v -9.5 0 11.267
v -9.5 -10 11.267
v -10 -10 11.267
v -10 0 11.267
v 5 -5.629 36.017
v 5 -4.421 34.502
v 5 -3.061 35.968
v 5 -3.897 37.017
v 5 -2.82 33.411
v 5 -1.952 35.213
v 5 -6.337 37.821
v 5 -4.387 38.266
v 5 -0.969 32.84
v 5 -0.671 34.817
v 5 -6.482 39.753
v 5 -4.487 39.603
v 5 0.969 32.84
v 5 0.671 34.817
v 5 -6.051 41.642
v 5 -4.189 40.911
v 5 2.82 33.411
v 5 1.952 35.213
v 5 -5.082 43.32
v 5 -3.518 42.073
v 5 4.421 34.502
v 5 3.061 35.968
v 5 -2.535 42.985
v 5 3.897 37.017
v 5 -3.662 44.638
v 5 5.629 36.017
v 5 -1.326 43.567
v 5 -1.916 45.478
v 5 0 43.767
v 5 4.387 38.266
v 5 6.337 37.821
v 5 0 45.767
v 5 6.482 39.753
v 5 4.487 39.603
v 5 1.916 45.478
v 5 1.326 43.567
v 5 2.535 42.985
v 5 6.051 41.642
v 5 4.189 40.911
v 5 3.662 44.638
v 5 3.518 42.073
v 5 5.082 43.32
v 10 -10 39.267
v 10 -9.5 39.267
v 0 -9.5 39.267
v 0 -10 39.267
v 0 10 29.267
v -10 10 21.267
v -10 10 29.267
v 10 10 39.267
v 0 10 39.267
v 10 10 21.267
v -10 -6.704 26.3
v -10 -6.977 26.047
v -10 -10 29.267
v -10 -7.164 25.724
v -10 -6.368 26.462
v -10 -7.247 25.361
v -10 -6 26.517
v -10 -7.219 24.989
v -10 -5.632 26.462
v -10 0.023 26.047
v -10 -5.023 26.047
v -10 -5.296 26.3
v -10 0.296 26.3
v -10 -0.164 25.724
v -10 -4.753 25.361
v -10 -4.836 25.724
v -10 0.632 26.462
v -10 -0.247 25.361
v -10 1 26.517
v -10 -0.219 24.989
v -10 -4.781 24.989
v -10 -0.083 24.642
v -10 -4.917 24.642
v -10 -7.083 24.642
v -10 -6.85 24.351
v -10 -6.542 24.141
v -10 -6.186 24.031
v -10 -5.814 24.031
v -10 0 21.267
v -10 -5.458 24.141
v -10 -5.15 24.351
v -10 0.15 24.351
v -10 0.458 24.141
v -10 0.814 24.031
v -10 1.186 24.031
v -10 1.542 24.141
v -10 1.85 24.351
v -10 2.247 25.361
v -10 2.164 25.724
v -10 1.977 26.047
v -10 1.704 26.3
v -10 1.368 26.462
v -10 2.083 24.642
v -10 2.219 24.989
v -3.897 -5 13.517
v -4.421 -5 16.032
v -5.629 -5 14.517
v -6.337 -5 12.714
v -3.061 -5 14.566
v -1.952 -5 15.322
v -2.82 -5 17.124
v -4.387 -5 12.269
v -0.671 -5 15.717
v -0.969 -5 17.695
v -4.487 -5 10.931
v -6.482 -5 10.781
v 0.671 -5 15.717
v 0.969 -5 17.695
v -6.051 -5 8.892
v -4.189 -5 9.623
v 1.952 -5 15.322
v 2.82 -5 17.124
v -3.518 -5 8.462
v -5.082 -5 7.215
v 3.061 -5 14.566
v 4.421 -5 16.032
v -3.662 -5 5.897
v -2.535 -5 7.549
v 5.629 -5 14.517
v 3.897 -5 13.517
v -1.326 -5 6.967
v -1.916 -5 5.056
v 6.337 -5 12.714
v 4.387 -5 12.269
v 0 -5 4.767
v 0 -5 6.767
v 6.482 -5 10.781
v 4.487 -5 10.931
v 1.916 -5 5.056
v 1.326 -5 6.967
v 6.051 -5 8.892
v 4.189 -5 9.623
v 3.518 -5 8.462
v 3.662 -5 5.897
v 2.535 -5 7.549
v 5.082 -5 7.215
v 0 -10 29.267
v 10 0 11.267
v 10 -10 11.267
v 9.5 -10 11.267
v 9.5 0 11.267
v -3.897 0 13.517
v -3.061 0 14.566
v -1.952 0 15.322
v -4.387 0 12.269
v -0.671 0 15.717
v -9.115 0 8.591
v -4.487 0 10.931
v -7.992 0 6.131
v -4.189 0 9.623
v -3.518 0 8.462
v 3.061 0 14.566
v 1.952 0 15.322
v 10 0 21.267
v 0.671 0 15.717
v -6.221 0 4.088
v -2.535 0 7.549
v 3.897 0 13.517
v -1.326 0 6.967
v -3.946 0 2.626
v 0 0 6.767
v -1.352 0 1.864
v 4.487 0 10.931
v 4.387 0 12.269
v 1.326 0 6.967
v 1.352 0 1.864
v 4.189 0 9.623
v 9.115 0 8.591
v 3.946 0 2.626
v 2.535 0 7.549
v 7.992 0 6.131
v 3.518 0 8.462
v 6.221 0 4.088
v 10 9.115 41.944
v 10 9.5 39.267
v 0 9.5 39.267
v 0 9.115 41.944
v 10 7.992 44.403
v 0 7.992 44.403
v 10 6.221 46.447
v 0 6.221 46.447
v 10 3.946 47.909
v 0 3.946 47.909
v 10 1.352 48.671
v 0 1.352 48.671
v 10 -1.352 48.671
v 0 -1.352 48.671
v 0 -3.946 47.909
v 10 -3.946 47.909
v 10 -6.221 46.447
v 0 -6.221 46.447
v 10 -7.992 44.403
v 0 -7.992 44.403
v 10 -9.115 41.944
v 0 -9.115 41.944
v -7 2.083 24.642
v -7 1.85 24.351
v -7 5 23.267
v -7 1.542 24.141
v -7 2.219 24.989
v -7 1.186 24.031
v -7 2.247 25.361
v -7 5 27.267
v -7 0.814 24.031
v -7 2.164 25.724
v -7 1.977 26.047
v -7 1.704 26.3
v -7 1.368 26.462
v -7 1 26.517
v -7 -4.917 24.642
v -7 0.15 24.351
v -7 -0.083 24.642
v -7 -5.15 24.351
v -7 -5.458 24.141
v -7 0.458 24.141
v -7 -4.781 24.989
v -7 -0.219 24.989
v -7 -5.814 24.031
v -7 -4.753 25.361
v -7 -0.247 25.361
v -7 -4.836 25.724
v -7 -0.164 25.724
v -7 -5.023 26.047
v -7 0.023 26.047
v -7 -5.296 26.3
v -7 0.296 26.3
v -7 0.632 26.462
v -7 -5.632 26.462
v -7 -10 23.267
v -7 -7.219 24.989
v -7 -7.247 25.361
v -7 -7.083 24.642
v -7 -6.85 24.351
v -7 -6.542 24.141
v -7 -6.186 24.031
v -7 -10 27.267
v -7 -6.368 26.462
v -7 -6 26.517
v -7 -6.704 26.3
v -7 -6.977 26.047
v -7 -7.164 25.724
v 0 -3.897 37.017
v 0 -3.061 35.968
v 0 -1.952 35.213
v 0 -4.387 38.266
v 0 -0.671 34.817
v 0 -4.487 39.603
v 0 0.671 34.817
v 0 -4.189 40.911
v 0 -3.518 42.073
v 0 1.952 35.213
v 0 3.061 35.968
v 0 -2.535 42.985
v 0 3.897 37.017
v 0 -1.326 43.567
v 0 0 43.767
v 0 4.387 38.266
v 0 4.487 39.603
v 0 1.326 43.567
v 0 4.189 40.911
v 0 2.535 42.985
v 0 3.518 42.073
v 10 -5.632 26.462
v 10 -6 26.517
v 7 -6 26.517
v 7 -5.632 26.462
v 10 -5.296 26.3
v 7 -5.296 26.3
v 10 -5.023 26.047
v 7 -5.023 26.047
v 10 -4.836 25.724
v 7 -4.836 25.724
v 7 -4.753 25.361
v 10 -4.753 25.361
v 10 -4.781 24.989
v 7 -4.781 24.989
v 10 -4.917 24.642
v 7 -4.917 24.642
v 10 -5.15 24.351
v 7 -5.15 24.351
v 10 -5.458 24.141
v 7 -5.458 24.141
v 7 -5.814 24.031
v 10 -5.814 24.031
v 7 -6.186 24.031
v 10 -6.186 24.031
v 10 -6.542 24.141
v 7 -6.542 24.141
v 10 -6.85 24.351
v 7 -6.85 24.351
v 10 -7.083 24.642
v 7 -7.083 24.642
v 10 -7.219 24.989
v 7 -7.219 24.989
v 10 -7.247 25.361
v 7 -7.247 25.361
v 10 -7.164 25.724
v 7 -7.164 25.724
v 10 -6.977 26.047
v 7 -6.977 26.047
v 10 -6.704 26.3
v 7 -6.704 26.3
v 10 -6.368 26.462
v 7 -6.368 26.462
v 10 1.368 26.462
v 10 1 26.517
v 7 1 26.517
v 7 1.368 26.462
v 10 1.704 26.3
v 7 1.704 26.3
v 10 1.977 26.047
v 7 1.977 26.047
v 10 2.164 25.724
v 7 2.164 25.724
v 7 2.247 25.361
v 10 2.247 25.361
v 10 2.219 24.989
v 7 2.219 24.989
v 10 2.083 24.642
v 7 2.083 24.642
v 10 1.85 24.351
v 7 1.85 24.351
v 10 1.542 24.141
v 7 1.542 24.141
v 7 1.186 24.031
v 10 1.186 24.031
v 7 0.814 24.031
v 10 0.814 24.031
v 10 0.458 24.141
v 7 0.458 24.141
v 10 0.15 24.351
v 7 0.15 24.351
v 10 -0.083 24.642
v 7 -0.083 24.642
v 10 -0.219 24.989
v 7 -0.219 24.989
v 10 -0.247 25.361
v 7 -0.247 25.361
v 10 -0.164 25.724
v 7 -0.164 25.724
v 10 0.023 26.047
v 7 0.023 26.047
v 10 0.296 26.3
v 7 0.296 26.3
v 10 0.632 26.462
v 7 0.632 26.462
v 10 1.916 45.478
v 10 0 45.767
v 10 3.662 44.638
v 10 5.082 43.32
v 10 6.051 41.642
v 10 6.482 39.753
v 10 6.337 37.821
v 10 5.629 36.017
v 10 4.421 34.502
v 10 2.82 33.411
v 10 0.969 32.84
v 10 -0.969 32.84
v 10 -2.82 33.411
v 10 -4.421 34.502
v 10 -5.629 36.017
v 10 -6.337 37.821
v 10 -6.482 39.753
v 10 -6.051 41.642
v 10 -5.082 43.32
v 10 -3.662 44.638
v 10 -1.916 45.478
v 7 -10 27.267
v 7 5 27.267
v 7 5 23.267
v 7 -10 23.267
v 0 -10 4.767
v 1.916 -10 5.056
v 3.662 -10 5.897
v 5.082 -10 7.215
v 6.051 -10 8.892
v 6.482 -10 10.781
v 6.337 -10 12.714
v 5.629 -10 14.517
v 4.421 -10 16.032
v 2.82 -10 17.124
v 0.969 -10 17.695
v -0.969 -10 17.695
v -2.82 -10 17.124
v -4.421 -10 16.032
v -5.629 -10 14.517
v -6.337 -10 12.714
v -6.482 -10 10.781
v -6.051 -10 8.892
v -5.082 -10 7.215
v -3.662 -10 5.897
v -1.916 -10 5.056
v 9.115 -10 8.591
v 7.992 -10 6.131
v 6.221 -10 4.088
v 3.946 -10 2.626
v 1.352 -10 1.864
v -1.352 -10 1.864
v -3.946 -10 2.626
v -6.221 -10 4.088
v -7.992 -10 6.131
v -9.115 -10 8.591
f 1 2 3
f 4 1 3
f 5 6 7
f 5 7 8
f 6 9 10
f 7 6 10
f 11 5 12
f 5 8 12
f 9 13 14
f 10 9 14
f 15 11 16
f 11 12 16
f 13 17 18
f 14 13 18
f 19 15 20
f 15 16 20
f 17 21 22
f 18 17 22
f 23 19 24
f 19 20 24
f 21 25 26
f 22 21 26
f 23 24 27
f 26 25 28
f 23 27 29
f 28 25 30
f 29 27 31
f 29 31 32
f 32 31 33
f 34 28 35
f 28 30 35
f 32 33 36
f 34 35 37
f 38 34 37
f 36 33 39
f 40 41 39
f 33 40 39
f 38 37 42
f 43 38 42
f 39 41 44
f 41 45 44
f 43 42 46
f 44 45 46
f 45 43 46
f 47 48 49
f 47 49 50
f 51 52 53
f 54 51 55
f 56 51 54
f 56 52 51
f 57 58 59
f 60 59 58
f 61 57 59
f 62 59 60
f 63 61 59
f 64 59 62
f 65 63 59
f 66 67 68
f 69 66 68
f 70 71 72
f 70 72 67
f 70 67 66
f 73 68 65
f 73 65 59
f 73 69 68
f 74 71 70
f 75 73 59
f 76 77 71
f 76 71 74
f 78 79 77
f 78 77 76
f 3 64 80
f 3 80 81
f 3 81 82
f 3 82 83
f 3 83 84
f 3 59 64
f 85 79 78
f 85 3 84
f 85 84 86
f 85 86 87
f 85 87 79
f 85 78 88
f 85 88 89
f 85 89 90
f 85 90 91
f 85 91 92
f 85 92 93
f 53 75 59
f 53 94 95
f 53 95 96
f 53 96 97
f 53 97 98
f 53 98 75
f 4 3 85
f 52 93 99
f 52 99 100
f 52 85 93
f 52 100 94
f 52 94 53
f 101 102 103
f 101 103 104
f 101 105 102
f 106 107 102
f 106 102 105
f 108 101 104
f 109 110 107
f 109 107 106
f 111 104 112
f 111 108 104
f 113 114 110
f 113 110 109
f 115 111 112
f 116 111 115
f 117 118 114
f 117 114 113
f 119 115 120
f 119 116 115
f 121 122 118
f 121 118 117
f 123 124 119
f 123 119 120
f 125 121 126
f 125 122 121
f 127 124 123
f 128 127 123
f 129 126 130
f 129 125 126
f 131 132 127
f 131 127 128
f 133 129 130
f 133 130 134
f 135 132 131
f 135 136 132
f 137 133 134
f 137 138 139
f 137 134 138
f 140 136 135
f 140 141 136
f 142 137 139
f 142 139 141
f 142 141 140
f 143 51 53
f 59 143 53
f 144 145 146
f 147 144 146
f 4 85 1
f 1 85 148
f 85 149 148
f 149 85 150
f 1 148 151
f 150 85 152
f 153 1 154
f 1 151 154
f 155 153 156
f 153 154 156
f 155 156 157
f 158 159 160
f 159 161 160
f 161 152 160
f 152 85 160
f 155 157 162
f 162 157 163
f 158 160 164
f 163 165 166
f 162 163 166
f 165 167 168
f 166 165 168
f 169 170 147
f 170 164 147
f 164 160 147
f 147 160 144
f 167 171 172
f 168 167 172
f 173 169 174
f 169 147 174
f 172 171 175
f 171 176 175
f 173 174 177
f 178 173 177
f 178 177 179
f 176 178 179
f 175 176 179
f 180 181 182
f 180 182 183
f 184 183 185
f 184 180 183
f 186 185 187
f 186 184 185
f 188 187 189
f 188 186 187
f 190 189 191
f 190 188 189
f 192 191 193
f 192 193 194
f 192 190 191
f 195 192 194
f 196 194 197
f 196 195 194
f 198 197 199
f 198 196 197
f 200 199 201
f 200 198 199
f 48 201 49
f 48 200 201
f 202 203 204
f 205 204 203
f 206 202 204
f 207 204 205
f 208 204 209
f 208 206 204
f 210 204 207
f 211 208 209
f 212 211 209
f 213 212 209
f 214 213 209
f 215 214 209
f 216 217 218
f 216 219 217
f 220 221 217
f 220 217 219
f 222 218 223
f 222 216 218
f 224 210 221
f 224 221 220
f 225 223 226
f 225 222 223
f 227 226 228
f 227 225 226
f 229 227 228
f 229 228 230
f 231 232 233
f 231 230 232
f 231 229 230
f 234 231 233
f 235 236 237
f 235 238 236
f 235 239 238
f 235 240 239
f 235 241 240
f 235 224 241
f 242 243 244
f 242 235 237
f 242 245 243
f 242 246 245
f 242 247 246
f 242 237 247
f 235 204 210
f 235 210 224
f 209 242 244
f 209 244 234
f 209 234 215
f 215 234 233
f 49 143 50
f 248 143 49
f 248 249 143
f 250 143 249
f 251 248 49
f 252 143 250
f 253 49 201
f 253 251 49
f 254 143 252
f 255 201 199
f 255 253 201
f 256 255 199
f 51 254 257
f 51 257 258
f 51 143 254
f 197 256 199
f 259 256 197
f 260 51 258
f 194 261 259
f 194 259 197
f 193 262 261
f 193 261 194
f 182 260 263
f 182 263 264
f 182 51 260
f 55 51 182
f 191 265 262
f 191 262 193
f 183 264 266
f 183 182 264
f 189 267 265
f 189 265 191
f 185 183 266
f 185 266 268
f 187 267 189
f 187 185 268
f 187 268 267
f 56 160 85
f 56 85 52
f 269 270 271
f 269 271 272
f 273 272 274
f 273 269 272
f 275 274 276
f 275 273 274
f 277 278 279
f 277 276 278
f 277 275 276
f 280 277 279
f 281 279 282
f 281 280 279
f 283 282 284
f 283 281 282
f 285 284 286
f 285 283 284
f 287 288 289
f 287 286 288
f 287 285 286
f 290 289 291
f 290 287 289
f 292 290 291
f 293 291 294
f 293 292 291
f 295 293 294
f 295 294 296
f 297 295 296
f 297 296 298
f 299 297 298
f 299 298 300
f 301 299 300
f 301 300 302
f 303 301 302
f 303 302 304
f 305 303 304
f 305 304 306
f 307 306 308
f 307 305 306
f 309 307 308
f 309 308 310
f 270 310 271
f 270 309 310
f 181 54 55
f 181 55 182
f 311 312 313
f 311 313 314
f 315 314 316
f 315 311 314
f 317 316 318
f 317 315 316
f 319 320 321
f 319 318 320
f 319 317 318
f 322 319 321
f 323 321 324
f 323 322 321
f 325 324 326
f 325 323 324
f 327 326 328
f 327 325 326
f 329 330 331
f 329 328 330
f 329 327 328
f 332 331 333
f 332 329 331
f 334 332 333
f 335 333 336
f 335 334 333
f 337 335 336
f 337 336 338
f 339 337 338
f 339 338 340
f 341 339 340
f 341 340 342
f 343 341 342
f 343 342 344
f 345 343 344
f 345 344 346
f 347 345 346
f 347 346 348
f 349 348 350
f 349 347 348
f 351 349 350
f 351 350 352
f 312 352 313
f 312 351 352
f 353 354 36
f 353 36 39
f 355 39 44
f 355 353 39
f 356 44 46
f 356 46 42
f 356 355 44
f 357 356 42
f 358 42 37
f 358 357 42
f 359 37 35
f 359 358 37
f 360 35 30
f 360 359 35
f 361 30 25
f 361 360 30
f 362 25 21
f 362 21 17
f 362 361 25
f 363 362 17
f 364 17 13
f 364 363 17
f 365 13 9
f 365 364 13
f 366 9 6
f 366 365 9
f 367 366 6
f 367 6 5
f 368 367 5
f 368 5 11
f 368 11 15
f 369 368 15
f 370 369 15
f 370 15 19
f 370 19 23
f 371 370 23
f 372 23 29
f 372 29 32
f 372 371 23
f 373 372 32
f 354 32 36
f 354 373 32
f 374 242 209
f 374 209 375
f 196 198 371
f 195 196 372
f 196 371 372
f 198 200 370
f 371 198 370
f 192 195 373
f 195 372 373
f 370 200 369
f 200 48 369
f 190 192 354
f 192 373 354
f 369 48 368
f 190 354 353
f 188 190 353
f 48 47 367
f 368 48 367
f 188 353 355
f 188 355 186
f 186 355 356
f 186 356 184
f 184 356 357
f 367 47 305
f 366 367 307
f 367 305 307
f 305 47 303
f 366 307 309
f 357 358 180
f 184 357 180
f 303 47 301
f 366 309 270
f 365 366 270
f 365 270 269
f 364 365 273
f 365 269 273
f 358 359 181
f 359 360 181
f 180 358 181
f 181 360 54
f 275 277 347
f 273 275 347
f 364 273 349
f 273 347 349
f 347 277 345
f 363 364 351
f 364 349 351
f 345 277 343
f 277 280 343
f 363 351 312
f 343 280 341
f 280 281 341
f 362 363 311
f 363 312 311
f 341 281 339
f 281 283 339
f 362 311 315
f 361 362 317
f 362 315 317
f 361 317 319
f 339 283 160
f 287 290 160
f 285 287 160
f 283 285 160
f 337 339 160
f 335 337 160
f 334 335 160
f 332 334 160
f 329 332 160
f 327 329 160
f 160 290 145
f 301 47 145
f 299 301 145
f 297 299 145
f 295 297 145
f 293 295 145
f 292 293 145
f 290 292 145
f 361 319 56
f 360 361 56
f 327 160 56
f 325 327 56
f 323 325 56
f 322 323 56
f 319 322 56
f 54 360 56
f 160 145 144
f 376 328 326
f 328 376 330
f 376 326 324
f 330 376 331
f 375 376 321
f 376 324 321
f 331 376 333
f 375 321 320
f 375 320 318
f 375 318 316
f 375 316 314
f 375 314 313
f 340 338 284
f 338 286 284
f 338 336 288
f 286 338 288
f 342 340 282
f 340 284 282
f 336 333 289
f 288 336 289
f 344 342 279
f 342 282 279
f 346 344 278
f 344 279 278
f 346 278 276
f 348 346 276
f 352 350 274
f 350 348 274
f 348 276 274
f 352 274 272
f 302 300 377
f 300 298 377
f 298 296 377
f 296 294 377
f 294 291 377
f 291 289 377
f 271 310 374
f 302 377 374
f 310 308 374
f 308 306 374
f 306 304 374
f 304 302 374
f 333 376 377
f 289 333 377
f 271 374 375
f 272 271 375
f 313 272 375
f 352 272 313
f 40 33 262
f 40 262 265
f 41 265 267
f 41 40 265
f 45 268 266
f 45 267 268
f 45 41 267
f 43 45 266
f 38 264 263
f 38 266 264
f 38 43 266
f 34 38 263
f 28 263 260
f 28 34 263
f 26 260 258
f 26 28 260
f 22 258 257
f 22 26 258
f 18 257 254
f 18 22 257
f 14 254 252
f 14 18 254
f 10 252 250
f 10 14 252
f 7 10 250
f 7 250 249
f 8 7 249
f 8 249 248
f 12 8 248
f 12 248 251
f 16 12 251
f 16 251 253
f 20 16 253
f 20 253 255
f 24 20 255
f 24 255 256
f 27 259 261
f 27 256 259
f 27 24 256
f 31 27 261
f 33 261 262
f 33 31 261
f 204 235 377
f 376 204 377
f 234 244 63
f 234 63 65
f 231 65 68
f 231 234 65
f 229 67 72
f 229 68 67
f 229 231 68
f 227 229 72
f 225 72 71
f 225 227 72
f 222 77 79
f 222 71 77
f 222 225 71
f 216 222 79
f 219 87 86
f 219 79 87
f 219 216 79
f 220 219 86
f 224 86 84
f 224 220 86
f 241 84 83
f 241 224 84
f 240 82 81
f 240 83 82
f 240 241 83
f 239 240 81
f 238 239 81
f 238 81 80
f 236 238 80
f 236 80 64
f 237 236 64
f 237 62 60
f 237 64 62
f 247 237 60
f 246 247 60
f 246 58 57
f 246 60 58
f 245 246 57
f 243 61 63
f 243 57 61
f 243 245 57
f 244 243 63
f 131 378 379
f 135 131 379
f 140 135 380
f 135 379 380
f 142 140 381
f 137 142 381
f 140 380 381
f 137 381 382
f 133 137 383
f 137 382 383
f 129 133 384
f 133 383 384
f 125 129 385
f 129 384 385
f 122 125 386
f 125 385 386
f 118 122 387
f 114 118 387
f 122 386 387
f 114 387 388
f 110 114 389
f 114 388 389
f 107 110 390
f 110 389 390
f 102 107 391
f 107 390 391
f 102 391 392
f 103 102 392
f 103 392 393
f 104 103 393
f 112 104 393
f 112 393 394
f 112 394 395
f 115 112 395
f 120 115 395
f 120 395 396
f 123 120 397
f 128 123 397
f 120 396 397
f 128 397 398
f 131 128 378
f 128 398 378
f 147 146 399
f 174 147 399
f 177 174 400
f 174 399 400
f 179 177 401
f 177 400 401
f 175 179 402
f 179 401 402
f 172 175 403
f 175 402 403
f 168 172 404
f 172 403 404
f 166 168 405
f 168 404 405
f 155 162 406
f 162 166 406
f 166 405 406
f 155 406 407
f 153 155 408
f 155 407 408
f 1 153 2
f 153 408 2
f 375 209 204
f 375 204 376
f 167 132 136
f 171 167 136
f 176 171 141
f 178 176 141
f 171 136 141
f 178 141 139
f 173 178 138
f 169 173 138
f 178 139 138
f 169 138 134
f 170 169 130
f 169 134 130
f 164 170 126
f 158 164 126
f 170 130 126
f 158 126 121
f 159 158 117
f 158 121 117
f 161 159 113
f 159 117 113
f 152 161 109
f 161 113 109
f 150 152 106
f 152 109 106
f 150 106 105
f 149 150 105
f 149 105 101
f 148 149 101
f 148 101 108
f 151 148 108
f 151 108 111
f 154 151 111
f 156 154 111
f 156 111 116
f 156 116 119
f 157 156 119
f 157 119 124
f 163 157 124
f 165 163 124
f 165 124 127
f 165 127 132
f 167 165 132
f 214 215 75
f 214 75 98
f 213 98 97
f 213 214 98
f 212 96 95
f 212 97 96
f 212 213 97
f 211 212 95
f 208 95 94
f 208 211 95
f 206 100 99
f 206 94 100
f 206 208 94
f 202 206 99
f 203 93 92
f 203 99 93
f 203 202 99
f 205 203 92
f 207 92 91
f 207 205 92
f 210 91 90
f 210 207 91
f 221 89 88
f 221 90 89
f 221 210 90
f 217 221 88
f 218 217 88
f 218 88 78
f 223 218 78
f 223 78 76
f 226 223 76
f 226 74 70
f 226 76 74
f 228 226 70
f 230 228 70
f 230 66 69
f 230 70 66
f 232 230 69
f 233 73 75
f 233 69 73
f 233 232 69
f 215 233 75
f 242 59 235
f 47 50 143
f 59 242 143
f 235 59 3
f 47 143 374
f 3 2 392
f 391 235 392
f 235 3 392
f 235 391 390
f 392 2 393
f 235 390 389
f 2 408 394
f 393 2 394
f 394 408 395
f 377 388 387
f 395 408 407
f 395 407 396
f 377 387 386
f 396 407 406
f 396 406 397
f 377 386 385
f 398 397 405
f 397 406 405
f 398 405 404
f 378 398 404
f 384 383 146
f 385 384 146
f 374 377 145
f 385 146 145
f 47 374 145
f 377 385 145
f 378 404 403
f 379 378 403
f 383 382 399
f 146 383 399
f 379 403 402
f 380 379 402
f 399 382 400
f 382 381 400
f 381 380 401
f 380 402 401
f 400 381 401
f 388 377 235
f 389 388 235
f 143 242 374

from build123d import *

# Parameters (mm, degrees)
SKETCH_1_W                = 20
SKETCH_1_H                = 20
EXTRUDE_1_DEPTH           = 50.534412113
SKETCH_7_W                = 21.267206056
SKETCH_7_H                = 10
CUT_EXTRUDE_6_DEPTH       = 34
SKETCH_3_R                = 4.5
CUT_EXTRUDE_2_DEPTH       = 21
SKETCH_2_R                = 6.5
CUT_EXTRUDE_9_DEPTH       = 5
MOVE_BODY_1_ANGLE         = 90
SKETCH_8_W                = 20
SKETCH_8_H                = 20
EXTRUDE_2_DEPTH           = 8
SKETCH_9_W                = 14
SKETCH_9_H                = 4
CUT_EXTRUDE_10_DEPTH      = 15
CUT_EXTRUDE_11_DEPTH      = 49
CUT_EXTRUDE_11_DEPTH_BACK = 49
SKETCH_10_R               = 1.25


# Read off the part's stored shape, not the designer's step: 교차3
with BuildPart() as part:
    # 스케치1 → 보스-돌출1 (new body)
    with BuildSketch(Plane.XY):
        Rectangle(SKETCH_1_W, SKETCH_1_H)
    extrude(amount=EXTRUDE_1_DEPTH)

    # 스케치7 → 컷-돌출6 (cut)
    with BuildSketch(Plane(origin=(10, 0, 0), x_dir=(0, 0, -1), z_dir=(1, 0, 0))):
        with Locations((-10.633603028, 5)):
            Rectangle(SKETCH_7_W, SKETCH_7_H)
    cut_extrude_6 = extrude(amount=-CUT_EXTRUDE_6_DEPTH, mode=Mode.SUBTRACT)

    # 스케치3 → 컷-돌출2 (cut)
    with BuildSketch(Plane(origin=(0, -10, 0), x_dir=(-1, 0, 0), z_dir=(0, -1, 0))):
        with Locations(Location((0, -11.267206056, 0), (0, 0, 90))):
            Circle(SKETCH_3_R)
        with BuildLine():
            Line((-21.262122506, -11.267206056), (-9.5, -11.267206056))
            ThreePointArc((-9.5, -11.267206056), (0, -1.767206056), (9.5, -11.267206056))
            Line((9.5, -11.267206056), (21.262122506, -11.267206056))
            ThreePointArc((21.262122506, -11.267206056), (0, 9.99491645), (-21.262122506, -11.267206056))
        make_face()
    cut_extrude_2 = extrude(amount=-CUT_EXTRUDE_2_DEPTH, mode=Mode.SUBTRACT)

    # 스케치2 → 컷-돌출9 (cut)
    with BuildSketch(Plane(origin=(0, -10, 0), x_dir=(-1, 0, 0), z_dir=(0, -1, 0))):
        with Locations(Location((0, -11.267206056, 0), (0, 0, 90))):
            Circle(SKETCH_2_R)
    cut_extrude_9 = extrude(amount=-CUT_EXTRUDE_9_DEPTH, mode=Mode.SUBTRACT)

    # 대칭 복사6: 컷-돌출6, 컷-돌출2, 컷-돌출9 across plane
    add(cut_extrude_6.mirror(Plane.XY.offset(25.267206056)), mode=Mode.SUBTRACT)
    add(cut_extrude_2.mirror(Plane.XY.offset(25.267206056)), mode=Mode.SUBTRACT)
    add(cut_extrude_9.mirror(Plane.XY.offset(25.267206056)), mode=Mode.SUBTRACT)


with BuildPart() as body_2:
    # 교차3: the piece on the far side of the plane
    add(part.part)
    split(bisect_by=Plane.XY.offset(25.267206056), keep=Keep.BOTTOM)


with BuildPart() as part_1:
    add(part.part)

    # 교차3
    split(bisect_by=Plane.XY.offset(25.267206056), keep=Keep.TOP)


with BuildPart() as part_2:
    # Move Body 1: moved
    add(part_1.part.rotate(Axis((0, 0, 0), (0, 0, 1)), MOVE_BODY_1_ANGLE))


    add(body_2.part)  # 보스-돌출2 merges body 2
    # 스케치8 → 보스-돌출2 (add)
    with BuildSketch(Plane.XY.offset(21.267206056)):
        Rectangle(SKETCH_8_W, SKETCH_8_H)
    extrude(amount=EXTRUDE_2_DEPTH)

    # 스케치9 → 컷-돌출10 (cut)
    with BuildSketch(Plane.XZ.offset(10)):
        with Locations((0, 25.267206056)):
            Rectangle(SKETCH_9_W, SKETCH_9_H)
    extrude(amount=-CUT_EXTRUDE_10_DEPTH, mode=Mode.SUBTRACT)

    # 스케치10 → 컷-돌출11 (cut, two sides: drawn at the far end of the back side and taken through both)
    with BuildSketch(Plane.ZY.offset(-7).offset(-CUT_EXTRUDE_11_DEPTH_BACK)):
        with Locations((25.267206056, -6)):
            Circle(SKETCH_10_R)
        with Locations((25.267206056, 1)):
            Circle(SKETCH_10_R)
    extrude(amount=CUT_EXTRUDE_11_DEPTH + CUT_EXTRUDE_11_DEPTH_BACK, mode=Mode.SUBTRACT)


solid = part_2.part
